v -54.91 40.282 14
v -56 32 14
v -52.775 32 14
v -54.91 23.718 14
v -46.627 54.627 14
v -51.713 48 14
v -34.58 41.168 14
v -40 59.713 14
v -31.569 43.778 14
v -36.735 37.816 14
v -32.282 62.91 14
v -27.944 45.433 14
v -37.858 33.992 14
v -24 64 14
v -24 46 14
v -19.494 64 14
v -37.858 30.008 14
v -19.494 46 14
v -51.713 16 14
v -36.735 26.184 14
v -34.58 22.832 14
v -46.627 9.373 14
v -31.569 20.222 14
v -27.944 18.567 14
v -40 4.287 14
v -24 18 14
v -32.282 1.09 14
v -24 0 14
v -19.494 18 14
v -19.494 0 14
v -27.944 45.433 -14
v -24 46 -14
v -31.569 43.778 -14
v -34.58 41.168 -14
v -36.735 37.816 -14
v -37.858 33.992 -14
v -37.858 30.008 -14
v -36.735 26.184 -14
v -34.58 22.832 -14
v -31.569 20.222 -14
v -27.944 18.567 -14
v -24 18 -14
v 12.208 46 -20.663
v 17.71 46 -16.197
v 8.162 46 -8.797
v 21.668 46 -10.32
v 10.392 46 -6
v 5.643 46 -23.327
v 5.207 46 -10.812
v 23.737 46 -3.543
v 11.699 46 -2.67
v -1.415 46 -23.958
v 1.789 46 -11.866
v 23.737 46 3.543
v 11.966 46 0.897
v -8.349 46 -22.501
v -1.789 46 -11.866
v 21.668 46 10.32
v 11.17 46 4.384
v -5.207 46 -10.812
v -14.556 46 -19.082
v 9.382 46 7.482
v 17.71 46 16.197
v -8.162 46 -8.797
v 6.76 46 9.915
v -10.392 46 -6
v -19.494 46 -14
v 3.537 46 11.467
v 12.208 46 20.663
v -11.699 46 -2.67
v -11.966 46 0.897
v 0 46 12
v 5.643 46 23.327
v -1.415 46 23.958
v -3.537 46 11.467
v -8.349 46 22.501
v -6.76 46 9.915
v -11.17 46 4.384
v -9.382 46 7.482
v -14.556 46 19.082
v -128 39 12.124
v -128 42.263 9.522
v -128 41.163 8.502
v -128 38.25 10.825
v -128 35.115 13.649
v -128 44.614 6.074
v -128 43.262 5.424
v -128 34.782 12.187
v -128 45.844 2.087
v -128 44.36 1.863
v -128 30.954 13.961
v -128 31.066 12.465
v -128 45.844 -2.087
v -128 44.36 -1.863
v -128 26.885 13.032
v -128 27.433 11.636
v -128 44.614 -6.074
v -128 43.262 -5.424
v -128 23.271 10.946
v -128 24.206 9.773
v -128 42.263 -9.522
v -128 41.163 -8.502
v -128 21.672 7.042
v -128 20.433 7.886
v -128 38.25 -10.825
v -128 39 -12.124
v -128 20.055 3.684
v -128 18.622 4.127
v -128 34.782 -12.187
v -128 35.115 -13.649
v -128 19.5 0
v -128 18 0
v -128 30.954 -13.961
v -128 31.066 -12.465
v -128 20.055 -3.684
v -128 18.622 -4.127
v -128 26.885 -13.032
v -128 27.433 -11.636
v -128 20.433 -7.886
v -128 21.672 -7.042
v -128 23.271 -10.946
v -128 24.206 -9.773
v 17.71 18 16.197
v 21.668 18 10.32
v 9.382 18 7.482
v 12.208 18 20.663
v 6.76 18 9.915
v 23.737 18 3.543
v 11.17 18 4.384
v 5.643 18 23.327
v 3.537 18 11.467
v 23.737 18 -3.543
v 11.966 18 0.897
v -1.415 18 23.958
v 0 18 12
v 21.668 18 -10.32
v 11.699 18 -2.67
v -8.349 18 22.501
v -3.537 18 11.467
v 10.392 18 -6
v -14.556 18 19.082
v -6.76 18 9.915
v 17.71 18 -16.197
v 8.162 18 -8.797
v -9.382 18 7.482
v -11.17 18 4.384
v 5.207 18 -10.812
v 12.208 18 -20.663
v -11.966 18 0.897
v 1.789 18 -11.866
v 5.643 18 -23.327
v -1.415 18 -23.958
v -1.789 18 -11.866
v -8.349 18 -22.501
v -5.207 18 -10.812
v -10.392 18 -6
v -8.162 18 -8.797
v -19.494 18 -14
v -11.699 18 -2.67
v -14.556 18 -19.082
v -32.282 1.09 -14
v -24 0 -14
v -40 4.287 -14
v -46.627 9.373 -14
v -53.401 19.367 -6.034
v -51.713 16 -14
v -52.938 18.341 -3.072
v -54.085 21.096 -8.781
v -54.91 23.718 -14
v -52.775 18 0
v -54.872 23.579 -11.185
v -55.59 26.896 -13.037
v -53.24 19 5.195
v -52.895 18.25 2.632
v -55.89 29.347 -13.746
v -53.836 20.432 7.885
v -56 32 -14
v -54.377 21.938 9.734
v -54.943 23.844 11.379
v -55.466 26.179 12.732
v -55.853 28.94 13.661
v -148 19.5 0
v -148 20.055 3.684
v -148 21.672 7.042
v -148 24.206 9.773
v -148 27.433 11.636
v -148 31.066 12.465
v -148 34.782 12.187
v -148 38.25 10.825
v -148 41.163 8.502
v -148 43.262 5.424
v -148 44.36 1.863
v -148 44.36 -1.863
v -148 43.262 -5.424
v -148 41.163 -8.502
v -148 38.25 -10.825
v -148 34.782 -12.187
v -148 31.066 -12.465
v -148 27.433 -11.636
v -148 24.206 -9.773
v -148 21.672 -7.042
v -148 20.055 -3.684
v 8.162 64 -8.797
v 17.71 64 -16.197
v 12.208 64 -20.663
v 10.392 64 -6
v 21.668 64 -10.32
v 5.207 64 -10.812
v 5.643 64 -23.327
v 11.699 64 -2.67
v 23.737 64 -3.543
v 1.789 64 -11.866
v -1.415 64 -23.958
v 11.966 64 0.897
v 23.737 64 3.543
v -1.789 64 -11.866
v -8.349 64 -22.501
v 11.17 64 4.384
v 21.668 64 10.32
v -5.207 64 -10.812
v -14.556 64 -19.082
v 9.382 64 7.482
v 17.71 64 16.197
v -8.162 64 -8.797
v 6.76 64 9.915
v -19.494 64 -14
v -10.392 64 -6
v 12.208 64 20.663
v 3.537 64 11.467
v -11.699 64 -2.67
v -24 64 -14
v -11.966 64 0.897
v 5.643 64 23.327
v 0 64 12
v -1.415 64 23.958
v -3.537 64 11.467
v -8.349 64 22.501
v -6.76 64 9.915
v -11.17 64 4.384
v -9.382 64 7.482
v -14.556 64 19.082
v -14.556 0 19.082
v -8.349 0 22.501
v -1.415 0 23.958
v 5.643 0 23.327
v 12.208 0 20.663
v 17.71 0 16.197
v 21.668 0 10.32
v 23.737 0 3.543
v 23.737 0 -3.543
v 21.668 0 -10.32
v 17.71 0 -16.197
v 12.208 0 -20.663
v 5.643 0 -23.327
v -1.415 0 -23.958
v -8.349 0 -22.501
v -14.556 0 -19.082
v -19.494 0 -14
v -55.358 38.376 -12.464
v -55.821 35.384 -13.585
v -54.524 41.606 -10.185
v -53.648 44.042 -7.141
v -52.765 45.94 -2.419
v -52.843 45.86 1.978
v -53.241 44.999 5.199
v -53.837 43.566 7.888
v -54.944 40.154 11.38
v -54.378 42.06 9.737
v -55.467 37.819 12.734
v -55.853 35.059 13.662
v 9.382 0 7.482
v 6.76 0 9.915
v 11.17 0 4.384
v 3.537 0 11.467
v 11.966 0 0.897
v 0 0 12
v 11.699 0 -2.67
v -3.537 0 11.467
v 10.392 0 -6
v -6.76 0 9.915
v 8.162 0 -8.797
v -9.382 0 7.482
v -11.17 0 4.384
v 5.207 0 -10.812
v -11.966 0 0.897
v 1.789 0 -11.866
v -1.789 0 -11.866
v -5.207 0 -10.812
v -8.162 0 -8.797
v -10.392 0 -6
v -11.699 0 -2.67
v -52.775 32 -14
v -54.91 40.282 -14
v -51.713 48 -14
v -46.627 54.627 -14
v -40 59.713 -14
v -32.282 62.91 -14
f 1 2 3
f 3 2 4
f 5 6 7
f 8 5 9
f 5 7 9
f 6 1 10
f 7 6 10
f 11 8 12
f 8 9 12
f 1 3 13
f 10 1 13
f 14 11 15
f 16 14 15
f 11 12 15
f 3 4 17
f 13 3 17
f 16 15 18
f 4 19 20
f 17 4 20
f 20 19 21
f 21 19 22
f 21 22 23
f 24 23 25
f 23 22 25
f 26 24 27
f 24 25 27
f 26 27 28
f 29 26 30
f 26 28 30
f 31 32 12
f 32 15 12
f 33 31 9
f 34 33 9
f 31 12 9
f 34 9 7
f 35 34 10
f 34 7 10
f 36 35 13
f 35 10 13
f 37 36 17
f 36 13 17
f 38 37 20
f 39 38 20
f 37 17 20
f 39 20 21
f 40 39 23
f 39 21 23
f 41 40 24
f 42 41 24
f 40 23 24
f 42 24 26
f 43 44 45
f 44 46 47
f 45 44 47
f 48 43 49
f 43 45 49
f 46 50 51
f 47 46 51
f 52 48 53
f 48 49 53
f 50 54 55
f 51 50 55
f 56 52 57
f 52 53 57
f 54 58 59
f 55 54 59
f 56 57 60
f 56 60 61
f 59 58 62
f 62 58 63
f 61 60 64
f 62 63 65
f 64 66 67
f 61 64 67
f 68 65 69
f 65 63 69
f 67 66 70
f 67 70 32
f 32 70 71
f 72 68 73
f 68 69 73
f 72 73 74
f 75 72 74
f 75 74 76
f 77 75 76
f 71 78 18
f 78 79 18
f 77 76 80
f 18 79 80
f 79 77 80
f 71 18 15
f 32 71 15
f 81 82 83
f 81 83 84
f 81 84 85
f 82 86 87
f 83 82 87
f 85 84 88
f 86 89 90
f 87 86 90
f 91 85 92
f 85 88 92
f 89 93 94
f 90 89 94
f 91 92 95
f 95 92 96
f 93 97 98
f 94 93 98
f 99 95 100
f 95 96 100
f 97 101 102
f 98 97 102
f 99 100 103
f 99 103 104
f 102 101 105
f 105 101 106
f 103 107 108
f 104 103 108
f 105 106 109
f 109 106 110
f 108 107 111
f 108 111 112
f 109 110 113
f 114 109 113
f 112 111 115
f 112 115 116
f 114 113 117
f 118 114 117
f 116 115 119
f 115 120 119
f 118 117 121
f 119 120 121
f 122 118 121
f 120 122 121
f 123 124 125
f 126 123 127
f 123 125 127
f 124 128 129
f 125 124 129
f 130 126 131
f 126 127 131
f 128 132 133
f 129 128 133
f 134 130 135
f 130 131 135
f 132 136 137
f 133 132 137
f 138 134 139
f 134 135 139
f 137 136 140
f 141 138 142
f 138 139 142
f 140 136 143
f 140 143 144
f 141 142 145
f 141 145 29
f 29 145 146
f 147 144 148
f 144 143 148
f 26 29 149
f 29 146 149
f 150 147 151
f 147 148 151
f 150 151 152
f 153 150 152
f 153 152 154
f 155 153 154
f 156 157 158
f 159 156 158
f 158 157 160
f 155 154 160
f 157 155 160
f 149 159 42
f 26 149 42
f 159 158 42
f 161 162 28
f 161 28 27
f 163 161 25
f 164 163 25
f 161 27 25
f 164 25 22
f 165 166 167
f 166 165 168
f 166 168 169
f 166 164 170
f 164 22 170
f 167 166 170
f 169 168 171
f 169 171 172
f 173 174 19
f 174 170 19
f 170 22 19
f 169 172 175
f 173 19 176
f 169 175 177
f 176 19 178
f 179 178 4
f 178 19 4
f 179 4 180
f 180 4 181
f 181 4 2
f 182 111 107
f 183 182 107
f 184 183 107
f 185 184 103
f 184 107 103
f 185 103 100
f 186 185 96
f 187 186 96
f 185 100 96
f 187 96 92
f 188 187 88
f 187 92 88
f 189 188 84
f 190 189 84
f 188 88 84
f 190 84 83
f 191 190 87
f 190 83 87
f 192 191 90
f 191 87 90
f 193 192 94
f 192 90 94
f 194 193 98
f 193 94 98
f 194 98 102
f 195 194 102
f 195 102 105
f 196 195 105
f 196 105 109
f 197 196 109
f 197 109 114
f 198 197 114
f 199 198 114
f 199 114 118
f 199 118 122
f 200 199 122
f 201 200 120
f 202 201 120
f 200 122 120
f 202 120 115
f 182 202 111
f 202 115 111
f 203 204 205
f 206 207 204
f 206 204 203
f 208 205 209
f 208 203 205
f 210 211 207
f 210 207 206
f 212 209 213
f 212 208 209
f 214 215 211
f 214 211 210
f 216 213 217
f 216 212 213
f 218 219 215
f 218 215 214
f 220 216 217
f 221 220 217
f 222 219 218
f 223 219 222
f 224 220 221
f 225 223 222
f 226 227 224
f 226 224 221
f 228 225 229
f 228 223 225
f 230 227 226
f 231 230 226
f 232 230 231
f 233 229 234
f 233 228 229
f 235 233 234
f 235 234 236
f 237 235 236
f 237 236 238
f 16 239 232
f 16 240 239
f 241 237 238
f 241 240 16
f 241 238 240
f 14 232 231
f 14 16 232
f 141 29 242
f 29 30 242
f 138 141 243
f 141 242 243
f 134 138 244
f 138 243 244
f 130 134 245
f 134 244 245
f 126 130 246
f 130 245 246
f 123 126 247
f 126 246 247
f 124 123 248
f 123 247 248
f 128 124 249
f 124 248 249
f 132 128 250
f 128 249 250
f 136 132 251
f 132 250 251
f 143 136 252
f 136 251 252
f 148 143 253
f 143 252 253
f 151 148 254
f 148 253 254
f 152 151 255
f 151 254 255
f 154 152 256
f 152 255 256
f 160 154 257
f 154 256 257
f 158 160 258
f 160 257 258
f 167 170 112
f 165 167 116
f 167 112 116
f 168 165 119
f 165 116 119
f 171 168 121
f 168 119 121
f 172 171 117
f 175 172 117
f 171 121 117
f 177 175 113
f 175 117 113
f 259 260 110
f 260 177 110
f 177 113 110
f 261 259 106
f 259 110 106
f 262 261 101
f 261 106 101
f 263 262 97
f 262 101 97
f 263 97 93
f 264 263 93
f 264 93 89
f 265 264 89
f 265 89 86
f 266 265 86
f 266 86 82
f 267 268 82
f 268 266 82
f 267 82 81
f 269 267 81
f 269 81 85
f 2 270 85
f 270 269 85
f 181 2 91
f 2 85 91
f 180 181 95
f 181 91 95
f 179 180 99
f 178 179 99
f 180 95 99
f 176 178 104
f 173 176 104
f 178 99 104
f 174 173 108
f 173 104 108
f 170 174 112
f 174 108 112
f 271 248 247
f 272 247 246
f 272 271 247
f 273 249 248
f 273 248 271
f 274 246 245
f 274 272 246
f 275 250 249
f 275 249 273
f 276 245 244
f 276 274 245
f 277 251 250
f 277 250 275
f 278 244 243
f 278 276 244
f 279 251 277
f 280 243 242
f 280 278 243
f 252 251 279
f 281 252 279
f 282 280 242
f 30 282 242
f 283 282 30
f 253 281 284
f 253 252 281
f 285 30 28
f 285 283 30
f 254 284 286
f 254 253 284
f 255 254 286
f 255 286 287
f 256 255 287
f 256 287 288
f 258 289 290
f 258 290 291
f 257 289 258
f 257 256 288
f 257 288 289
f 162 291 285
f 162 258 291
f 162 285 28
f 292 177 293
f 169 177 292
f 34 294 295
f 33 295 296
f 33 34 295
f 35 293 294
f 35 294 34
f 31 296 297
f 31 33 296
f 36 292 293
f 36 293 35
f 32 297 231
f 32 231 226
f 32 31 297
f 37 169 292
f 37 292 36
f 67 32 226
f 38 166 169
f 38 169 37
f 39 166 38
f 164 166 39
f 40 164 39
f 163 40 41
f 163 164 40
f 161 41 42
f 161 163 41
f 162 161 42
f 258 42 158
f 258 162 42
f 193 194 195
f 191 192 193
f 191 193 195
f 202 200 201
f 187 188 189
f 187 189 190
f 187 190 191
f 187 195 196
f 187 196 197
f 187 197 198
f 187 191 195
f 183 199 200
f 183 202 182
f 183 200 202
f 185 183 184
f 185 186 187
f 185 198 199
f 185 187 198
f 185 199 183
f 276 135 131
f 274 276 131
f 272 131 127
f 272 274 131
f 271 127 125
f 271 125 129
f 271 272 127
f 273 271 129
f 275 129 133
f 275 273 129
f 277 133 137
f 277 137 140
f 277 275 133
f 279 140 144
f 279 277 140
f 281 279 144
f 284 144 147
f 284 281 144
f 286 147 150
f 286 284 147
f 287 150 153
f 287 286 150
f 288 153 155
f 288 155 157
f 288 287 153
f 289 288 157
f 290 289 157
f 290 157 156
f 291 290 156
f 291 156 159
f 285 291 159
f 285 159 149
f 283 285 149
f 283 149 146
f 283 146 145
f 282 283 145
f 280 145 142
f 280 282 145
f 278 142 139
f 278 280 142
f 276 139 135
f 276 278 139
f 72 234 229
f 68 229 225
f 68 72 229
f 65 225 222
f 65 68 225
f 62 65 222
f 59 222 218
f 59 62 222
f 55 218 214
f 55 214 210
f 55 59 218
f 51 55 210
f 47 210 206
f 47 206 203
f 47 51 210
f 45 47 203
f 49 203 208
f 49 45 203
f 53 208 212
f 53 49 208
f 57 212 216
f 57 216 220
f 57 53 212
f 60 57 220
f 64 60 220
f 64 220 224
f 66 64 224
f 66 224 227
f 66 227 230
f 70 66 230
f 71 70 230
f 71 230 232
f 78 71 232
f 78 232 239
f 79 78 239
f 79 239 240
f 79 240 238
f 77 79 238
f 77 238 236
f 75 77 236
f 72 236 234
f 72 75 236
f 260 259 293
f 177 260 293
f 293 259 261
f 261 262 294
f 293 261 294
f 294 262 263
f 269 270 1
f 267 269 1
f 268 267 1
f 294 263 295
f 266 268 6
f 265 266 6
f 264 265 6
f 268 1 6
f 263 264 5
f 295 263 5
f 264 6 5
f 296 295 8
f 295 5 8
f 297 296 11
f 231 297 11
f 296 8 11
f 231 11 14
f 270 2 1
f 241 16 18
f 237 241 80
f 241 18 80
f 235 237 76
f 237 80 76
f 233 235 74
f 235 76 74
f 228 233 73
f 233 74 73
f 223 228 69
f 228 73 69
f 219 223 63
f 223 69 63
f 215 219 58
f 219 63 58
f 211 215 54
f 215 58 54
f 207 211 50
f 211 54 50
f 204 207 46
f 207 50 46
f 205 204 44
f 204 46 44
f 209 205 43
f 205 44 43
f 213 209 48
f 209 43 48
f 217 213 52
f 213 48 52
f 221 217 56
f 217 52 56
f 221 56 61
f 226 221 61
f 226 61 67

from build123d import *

# Parameters (mm, degrees)
SKETCH2_R           = 24
SKETCH2_R_2         = 12
BOSS_EXTRUDE2_DEPTH = 18
SKETCH3_R           = 24
SKETCH3_R_2         = 12
BOSS_EXTRUDE3_DEPTH = 18
BOSS_EXTRUDE4_DEPTH = 14
SKETCH6_R           = 12.5
BOSS_EXTRUDE5_DEPTH = 20
BOSS_EXTRUDE7_START = -18
BOSS_EXTRUDE7_DEPTH = 18
BOSS_EXTRUDE8_DEPTH = 18


with BuildPart() as part:
    # Sketch2 → Boss-Extrude2 (new body)
    with BuildSketch(Plane(origin=(0, 0, 0), x_dir=(1, 0, 0), z_dir=(0, 1, 0))):
        with Locations(Location((0, 0, 0), (0, 0, 270))):
            Circle(SKETCH2_R)
        with Locations(Location((0, 0, 0), (0, 0, 270))):
            Circle(SKETCH2_R_2, mode=Mode.SUBTRACT)
    extrude(amount=BOSS_EXTRUDE2_DEPTH)



with BuildPart() as body_2:
    # Sketch3 → Boss-Extrude3 (new body)
    with BuildSketch(Plane(origin=(0, 46, 0), x_dir=(1, 0, 0), z_dir=(0, 1, 0))):
        with Locations(Location((0, 0, 0), (0, 0, 270))):
            Circle(SKETCH3_R)
        with Locations(Location((0, 0, 0), (0, 0, 270))):
            Circle(SKETCH3_R_2, mode=Mode.SUBTRACT)
    extrude(amount=BOSS_EXTRUDE3_DEPTH)



with BuildPart() as body_3:
    # Sketch4 → Boss-Extrude4 (new, symmetric)
    with BuildSketch(Plane.XY):
        with BuildLine():
            Line((-24, 64), (-24, 46))
            ThreePointArc((-24, 46), (-38, 32), (-24, 18))
            Line((-24, 18), (-24, 0))
            ThreePointArc((-24, 0), (-56, 32), (-24, 64))
        make_face()
    extrude(amount=BOSS_EXTRUDE4_DEPTH, both=True)

    # Sketch5 → Revolve1 (revolve)
    with BuildSketch(Plane.XY, mode=Mode.PRIVATE) as revolve1_sk:
        with BuildLine():
            Line((-52.77498914, 46), (-128, 46))
            Line((-128, 46), (-128, 32))
            Line((-128, 32), (-56, 32))
            ThreePointArc((-56, 32), (-55.183326093, 39.183326093), (-52.77498914, 46))
        make_face()
    revolve(revolve1_sk.sketch.rotate(Axis((-128, 32, 0), (1, 0, 0)), 180), axis=Axis((-128, 32, 0), (1, 0, 0)))

    # Sketch6 → Boss-Extrude5 (add)
    with BuildSketch(Plane.ZY.offset(128)):
        with Locations(Location((0, 32, 0), (0, 0, 270))):
            Circle(SKETCH6_R)
    extrude(amount=BOSS_EXTRUDE5_DEPTH)


with BuildPart() as body_2_1:
    add(body_2.part)

    add(body_3.part)  # Boss-Extrude7 merges body 3
    # Sketch7 → Boss-Extrude7 (add)
    with BuildSketch(Plane(origin=(0, 64, 0), x_dir=(1, 0, 0), z_dir=(0, 1, 0)).offset(BOSS_EXTRUDE7_START)):
        with BuildLine():
            Line((-24, 14), (-19.49358869, 14))
            ThreePointArc((-19.49358869, 14), (-22.845635563, 7.353702178), (-24, 0))
            Line((-24, 0), (-24, 14))
        make_face()
    boss_extrude7 = extrude(amount=BOSS_EXTRUDE7_DEPTH)

    # Mirror1: Boss-Extrude7 across plane
    add(boss_extrude7.mirror(Plane.XY))


with BuildPart() as part_1:
    add(part.part)

    add(body_2_1.part)  # Boss-Extrude8 merges body 2
    # Sketch8 → Boss-Extrude8 (add)
    with BuildSketch(Plane.XZ):
        with BuildLine():
            Line((-24, 14), (-19.49358869, 14))
            ThreePointArc((-19.49358869, 14), (-22.845635563, 7.353702178), (-24, 0))
            Line((-24, 0), (-24, 14))
        make_face()
    boss_extrude8 = extrude(amount=-BOSS_EXTRUDE8_DEPTH)

    # Mirror2: Boss-Extrude8 across plane
    add(boss_extrude8.mirror(Plane.XY))


solid = part_1.part
